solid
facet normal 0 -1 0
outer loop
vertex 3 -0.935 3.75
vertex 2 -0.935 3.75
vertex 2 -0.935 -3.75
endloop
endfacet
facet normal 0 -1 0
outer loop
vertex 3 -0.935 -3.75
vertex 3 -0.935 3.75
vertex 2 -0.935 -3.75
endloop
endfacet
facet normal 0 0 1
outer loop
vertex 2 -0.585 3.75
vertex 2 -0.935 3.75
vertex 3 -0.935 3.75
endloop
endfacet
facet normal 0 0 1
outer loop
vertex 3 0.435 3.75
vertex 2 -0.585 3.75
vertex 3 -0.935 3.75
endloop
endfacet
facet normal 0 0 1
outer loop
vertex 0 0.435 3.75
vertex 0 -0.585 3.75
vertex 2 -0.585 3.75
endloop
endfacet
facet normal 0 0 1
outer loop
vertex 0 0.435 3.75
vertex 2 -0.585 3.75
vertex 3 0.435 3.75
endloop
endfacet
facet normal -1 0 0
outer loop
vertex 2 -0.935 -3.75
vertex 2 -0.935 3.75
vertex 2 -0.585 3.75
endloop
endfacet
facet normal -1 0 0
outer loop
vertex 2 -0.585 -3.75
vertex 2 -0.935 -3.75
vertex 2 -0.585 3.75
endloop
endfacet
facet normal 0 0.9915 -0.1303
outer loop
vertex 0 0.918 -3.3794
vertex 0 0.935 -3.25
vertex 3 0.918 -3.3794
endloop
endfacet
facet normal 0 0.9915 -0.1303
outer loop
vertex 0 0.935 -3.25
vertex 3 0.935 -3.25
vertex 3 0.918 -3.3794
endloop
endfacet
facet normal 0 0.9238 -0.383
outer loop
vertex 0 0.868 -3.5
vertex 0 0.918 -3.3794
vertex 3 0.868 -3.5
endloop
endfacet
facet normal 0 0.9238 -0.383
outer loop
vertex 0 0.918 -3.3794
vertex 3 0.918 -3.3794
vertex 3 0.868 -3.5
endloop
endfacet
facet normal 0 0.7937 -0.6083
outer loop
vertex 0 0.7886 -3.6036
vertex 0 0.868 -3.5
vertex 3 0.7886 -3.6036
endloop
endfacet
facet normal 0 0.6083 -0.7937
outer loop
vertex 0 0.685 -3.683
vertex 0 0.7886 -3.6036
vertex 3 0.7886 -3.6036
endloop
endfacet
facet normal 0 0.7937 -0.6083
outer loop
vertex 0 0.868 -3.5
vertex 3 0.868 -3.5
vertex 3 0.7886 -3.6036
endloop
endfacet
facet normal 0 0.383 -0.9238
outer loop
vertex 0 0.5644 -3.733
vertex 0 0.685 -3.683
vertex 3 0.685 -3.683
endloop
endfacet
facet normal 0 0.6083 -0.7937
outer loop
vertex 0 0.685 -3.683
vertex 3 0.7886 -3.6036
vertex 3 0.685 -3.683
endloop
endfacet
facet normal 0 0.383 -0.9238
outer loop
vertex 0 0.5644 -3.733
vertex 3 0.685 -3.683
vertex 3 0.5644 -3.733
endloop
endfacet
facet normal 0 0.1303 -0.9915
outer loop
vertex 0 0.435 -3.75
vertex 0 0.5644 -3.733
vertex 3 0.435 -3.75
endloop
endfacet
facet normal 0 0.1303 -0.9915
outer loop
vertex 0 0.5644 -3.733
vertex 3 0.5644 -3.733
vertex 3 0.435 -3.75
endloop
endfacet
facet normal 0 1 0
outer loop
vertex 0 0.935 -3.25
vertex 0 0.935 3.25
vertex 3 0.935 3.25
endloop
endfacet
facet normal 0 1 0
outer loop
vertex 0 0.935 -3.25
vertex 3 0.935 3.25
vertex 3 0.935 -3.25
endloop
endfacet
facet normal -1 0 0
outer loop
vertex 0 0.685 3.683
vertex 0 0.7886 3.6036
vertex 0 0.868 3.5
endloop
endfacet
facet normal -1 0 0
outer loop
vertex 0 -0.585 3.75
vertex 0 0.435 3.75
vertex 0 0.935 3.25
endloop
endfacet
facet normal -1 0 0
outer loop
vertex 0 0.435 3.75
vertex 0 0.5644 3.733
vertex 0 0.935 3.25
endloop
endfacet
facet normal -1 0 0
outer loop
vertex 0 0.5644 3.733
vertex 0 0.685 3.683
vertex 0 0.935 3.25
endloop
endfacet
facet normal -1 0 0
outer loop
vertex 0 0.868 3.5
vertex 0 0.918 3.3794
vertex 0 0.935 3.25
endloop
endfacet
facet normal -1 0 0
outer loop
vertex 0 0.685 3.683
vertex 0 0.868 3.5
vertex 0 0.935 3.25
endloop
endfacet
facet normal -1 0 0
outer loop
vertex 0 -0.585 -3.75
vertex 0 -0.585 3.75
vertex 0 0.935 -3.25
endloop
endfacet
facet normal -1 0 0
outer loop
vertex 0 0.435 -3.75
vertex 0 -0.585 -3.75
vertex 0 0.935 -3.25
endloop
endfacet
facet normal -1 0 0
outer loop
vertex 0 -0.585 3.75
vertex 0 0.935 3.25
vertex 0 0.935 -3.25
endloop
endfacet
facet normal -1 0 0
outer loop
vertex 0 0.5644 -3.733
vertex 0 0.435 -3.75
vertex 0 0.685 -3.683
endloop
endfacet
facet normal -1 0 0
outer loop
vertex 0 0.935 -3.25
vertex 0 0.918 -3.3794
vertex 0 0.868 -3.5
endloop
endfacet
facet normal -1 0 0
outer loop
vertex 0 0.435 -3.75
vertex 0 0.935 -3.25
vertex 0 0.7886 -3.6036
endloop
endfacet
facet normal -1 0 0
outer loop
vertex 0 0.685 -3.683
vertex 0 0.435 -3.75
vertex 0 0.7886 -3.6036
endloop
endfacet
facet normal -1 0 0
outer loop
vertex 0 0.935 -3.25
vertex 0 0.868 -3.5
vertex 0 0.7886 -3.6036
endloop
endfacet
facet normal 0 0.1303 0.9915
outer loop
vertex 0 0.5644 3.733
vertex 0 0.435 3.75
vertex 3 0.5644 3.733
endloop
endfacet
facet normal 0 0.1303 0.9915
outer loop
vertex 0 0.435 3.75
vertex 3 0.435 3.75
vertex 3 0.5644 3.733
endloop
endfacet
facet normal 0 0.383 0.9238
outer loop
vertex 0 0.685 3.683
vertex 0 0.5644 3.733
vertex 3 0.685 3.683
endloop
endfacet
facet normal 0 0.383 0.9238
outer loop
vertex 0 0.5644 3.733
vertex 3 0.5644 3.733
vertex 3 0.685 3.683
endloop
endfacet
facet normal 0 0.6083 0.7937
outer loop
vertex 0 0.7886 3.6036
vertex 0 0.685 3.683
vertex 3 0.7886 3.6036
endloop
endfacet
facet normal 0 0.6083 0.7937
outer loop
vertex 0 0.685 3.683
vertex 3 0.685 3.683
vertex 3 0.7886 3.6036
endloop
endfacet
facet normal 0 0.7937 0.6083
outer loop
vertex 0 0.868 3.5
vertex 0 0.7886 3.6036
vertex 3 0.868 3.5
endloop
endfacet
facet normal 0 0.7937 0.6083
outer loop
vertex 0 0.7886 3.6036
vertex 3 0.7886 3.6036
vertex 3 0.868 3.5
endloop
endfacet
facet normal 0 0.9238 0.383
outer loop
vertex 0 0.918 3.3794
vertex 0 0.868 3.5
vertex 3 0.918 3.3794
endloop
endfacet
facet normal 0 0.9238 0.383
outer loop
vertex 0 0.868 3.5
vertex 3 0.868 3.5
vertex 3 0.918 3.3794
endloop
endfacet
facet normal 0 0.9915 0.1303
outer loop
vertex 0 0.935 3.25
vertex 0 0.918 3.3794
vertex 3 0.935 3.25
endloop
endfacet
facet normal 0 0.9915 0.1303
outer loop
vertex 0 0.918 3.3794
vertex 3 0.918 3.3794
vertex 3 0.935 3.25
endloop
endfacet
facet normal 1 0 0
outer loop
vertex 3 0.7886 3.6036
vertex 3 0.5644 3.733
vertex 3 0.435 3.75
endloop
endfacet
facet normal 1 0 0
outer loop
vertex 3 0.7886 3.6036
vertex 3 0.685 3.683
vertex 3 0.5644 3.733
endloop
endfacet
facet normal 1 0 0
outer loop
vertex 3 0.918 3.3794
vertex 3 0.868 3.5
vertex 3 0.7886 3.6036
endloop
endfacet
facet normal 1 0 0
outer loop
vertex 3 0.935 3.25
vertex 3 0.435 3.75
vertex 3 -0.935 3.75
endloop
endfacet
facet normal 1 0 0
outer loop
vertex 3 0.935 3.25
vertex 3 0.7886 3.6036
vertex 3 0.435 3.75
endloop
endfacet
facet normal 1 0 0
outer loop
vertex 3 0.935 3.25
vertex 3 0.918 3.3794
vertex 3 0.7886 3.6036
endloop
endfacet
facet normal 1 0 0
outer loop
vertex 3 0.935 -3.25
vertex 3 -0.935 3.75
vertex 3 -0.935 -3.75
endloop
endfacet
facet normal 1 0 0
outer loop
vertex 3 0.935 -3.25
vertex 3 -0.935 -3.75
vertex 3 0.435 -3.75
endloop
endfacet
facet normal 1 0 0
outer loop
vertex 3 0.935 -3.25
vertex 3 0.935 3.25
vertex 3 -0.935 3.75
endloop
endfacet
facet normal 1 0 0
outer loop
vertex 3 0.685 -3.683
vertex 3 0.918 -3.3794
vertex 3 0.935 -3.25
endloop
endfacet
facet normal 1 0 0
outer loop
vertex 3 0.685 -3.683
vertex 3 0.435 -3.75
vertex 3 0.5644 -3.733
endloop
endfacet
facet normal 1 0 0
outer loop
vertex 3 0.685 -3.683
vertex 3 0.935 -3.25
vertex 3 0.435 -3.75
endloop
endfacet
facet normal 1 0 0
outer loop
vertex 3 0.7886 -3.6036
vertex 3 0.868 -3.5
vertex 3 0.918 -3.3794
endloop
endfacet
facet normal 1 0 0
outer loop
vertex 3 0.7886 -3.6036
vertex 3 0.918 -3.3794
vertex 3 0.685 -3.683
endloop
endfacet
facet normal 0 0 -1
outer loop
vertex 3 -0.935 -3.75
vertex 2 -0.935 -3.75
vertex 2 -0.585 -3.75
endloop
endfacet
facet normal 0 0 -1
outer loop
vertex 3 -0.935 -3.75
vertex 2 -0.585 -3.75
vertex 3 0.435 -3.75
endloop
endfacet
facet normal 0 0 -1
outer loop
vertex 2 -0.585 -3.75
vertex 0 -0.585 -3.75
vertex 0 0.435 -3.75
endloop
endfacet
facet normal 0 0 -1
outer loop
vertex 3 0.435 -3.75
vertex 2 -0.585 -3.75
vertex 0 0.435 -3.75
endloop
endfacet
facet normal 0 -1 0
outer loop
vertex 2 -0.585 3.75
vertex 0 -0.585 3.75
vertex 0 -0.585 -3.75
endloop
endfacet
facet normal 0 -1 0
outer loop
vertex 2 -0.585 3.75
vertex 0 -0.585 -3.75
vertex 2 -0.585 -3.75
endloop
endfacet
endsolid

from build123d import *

# Parameters (mm, degrees)
CROQUIS1_W              = 7.5
CROQUIS1_H              = 1.87
SALIENTE_EXTRUIR1_DEPTH = 3
CORTAR_EXTRUIR1_REACH   = 10.132
CROQUIS2_W              = 2
CROQUIS2_H              = 0.35
REDONDEO1_R             = 0.5


with BuildPart() as part:
    # Croquis1 → Saliente-Extruir1 (new body)
    with BuildSketch(Plane(origin=(0, 0, 0), x_dir=(0, 0, -1), z_dir=(1, 0, 0))):
        Rectangle(CROQUIS1_W, CROQUIS1_H)
    extrude(amount=SALIENTE_EXTRUIR1_DEPTH)

    # Croquis2 → Cortar-Extruir1 (cut, up to next)
    with BuildSketch(Plane.XY.offset(3.75), mode=Mode.PRIVATE) as cortar_extruir1_sk1:
        with Locations((1, -0.76)):
            Rectangle(CROQUIS2_W, CROQUIS2_H)
    cortar_extruir1_tool1 = extrude(cortar_extruir1_sk1.sketch, amount=-CORTAR_EXTRUIR1_REACH, mode=Mode.PRIVATE) & part.part
    add(cortar_extruir1_tool1.solids().sort_by_distance((1, -0.76, 3.75))[0], mode=Mode.SUBTRACT)

    # Redondeo1
    redondeo1_edges = [part.edges().sort_by_distance(p)[0] for p in [
        (1.5, 0.935, 3.75),
        (1.5, 0.935, -3.75),
    ]]
    fillet(redondeo1_edges, radius=REDONDEO1_R)


solid = part.part
